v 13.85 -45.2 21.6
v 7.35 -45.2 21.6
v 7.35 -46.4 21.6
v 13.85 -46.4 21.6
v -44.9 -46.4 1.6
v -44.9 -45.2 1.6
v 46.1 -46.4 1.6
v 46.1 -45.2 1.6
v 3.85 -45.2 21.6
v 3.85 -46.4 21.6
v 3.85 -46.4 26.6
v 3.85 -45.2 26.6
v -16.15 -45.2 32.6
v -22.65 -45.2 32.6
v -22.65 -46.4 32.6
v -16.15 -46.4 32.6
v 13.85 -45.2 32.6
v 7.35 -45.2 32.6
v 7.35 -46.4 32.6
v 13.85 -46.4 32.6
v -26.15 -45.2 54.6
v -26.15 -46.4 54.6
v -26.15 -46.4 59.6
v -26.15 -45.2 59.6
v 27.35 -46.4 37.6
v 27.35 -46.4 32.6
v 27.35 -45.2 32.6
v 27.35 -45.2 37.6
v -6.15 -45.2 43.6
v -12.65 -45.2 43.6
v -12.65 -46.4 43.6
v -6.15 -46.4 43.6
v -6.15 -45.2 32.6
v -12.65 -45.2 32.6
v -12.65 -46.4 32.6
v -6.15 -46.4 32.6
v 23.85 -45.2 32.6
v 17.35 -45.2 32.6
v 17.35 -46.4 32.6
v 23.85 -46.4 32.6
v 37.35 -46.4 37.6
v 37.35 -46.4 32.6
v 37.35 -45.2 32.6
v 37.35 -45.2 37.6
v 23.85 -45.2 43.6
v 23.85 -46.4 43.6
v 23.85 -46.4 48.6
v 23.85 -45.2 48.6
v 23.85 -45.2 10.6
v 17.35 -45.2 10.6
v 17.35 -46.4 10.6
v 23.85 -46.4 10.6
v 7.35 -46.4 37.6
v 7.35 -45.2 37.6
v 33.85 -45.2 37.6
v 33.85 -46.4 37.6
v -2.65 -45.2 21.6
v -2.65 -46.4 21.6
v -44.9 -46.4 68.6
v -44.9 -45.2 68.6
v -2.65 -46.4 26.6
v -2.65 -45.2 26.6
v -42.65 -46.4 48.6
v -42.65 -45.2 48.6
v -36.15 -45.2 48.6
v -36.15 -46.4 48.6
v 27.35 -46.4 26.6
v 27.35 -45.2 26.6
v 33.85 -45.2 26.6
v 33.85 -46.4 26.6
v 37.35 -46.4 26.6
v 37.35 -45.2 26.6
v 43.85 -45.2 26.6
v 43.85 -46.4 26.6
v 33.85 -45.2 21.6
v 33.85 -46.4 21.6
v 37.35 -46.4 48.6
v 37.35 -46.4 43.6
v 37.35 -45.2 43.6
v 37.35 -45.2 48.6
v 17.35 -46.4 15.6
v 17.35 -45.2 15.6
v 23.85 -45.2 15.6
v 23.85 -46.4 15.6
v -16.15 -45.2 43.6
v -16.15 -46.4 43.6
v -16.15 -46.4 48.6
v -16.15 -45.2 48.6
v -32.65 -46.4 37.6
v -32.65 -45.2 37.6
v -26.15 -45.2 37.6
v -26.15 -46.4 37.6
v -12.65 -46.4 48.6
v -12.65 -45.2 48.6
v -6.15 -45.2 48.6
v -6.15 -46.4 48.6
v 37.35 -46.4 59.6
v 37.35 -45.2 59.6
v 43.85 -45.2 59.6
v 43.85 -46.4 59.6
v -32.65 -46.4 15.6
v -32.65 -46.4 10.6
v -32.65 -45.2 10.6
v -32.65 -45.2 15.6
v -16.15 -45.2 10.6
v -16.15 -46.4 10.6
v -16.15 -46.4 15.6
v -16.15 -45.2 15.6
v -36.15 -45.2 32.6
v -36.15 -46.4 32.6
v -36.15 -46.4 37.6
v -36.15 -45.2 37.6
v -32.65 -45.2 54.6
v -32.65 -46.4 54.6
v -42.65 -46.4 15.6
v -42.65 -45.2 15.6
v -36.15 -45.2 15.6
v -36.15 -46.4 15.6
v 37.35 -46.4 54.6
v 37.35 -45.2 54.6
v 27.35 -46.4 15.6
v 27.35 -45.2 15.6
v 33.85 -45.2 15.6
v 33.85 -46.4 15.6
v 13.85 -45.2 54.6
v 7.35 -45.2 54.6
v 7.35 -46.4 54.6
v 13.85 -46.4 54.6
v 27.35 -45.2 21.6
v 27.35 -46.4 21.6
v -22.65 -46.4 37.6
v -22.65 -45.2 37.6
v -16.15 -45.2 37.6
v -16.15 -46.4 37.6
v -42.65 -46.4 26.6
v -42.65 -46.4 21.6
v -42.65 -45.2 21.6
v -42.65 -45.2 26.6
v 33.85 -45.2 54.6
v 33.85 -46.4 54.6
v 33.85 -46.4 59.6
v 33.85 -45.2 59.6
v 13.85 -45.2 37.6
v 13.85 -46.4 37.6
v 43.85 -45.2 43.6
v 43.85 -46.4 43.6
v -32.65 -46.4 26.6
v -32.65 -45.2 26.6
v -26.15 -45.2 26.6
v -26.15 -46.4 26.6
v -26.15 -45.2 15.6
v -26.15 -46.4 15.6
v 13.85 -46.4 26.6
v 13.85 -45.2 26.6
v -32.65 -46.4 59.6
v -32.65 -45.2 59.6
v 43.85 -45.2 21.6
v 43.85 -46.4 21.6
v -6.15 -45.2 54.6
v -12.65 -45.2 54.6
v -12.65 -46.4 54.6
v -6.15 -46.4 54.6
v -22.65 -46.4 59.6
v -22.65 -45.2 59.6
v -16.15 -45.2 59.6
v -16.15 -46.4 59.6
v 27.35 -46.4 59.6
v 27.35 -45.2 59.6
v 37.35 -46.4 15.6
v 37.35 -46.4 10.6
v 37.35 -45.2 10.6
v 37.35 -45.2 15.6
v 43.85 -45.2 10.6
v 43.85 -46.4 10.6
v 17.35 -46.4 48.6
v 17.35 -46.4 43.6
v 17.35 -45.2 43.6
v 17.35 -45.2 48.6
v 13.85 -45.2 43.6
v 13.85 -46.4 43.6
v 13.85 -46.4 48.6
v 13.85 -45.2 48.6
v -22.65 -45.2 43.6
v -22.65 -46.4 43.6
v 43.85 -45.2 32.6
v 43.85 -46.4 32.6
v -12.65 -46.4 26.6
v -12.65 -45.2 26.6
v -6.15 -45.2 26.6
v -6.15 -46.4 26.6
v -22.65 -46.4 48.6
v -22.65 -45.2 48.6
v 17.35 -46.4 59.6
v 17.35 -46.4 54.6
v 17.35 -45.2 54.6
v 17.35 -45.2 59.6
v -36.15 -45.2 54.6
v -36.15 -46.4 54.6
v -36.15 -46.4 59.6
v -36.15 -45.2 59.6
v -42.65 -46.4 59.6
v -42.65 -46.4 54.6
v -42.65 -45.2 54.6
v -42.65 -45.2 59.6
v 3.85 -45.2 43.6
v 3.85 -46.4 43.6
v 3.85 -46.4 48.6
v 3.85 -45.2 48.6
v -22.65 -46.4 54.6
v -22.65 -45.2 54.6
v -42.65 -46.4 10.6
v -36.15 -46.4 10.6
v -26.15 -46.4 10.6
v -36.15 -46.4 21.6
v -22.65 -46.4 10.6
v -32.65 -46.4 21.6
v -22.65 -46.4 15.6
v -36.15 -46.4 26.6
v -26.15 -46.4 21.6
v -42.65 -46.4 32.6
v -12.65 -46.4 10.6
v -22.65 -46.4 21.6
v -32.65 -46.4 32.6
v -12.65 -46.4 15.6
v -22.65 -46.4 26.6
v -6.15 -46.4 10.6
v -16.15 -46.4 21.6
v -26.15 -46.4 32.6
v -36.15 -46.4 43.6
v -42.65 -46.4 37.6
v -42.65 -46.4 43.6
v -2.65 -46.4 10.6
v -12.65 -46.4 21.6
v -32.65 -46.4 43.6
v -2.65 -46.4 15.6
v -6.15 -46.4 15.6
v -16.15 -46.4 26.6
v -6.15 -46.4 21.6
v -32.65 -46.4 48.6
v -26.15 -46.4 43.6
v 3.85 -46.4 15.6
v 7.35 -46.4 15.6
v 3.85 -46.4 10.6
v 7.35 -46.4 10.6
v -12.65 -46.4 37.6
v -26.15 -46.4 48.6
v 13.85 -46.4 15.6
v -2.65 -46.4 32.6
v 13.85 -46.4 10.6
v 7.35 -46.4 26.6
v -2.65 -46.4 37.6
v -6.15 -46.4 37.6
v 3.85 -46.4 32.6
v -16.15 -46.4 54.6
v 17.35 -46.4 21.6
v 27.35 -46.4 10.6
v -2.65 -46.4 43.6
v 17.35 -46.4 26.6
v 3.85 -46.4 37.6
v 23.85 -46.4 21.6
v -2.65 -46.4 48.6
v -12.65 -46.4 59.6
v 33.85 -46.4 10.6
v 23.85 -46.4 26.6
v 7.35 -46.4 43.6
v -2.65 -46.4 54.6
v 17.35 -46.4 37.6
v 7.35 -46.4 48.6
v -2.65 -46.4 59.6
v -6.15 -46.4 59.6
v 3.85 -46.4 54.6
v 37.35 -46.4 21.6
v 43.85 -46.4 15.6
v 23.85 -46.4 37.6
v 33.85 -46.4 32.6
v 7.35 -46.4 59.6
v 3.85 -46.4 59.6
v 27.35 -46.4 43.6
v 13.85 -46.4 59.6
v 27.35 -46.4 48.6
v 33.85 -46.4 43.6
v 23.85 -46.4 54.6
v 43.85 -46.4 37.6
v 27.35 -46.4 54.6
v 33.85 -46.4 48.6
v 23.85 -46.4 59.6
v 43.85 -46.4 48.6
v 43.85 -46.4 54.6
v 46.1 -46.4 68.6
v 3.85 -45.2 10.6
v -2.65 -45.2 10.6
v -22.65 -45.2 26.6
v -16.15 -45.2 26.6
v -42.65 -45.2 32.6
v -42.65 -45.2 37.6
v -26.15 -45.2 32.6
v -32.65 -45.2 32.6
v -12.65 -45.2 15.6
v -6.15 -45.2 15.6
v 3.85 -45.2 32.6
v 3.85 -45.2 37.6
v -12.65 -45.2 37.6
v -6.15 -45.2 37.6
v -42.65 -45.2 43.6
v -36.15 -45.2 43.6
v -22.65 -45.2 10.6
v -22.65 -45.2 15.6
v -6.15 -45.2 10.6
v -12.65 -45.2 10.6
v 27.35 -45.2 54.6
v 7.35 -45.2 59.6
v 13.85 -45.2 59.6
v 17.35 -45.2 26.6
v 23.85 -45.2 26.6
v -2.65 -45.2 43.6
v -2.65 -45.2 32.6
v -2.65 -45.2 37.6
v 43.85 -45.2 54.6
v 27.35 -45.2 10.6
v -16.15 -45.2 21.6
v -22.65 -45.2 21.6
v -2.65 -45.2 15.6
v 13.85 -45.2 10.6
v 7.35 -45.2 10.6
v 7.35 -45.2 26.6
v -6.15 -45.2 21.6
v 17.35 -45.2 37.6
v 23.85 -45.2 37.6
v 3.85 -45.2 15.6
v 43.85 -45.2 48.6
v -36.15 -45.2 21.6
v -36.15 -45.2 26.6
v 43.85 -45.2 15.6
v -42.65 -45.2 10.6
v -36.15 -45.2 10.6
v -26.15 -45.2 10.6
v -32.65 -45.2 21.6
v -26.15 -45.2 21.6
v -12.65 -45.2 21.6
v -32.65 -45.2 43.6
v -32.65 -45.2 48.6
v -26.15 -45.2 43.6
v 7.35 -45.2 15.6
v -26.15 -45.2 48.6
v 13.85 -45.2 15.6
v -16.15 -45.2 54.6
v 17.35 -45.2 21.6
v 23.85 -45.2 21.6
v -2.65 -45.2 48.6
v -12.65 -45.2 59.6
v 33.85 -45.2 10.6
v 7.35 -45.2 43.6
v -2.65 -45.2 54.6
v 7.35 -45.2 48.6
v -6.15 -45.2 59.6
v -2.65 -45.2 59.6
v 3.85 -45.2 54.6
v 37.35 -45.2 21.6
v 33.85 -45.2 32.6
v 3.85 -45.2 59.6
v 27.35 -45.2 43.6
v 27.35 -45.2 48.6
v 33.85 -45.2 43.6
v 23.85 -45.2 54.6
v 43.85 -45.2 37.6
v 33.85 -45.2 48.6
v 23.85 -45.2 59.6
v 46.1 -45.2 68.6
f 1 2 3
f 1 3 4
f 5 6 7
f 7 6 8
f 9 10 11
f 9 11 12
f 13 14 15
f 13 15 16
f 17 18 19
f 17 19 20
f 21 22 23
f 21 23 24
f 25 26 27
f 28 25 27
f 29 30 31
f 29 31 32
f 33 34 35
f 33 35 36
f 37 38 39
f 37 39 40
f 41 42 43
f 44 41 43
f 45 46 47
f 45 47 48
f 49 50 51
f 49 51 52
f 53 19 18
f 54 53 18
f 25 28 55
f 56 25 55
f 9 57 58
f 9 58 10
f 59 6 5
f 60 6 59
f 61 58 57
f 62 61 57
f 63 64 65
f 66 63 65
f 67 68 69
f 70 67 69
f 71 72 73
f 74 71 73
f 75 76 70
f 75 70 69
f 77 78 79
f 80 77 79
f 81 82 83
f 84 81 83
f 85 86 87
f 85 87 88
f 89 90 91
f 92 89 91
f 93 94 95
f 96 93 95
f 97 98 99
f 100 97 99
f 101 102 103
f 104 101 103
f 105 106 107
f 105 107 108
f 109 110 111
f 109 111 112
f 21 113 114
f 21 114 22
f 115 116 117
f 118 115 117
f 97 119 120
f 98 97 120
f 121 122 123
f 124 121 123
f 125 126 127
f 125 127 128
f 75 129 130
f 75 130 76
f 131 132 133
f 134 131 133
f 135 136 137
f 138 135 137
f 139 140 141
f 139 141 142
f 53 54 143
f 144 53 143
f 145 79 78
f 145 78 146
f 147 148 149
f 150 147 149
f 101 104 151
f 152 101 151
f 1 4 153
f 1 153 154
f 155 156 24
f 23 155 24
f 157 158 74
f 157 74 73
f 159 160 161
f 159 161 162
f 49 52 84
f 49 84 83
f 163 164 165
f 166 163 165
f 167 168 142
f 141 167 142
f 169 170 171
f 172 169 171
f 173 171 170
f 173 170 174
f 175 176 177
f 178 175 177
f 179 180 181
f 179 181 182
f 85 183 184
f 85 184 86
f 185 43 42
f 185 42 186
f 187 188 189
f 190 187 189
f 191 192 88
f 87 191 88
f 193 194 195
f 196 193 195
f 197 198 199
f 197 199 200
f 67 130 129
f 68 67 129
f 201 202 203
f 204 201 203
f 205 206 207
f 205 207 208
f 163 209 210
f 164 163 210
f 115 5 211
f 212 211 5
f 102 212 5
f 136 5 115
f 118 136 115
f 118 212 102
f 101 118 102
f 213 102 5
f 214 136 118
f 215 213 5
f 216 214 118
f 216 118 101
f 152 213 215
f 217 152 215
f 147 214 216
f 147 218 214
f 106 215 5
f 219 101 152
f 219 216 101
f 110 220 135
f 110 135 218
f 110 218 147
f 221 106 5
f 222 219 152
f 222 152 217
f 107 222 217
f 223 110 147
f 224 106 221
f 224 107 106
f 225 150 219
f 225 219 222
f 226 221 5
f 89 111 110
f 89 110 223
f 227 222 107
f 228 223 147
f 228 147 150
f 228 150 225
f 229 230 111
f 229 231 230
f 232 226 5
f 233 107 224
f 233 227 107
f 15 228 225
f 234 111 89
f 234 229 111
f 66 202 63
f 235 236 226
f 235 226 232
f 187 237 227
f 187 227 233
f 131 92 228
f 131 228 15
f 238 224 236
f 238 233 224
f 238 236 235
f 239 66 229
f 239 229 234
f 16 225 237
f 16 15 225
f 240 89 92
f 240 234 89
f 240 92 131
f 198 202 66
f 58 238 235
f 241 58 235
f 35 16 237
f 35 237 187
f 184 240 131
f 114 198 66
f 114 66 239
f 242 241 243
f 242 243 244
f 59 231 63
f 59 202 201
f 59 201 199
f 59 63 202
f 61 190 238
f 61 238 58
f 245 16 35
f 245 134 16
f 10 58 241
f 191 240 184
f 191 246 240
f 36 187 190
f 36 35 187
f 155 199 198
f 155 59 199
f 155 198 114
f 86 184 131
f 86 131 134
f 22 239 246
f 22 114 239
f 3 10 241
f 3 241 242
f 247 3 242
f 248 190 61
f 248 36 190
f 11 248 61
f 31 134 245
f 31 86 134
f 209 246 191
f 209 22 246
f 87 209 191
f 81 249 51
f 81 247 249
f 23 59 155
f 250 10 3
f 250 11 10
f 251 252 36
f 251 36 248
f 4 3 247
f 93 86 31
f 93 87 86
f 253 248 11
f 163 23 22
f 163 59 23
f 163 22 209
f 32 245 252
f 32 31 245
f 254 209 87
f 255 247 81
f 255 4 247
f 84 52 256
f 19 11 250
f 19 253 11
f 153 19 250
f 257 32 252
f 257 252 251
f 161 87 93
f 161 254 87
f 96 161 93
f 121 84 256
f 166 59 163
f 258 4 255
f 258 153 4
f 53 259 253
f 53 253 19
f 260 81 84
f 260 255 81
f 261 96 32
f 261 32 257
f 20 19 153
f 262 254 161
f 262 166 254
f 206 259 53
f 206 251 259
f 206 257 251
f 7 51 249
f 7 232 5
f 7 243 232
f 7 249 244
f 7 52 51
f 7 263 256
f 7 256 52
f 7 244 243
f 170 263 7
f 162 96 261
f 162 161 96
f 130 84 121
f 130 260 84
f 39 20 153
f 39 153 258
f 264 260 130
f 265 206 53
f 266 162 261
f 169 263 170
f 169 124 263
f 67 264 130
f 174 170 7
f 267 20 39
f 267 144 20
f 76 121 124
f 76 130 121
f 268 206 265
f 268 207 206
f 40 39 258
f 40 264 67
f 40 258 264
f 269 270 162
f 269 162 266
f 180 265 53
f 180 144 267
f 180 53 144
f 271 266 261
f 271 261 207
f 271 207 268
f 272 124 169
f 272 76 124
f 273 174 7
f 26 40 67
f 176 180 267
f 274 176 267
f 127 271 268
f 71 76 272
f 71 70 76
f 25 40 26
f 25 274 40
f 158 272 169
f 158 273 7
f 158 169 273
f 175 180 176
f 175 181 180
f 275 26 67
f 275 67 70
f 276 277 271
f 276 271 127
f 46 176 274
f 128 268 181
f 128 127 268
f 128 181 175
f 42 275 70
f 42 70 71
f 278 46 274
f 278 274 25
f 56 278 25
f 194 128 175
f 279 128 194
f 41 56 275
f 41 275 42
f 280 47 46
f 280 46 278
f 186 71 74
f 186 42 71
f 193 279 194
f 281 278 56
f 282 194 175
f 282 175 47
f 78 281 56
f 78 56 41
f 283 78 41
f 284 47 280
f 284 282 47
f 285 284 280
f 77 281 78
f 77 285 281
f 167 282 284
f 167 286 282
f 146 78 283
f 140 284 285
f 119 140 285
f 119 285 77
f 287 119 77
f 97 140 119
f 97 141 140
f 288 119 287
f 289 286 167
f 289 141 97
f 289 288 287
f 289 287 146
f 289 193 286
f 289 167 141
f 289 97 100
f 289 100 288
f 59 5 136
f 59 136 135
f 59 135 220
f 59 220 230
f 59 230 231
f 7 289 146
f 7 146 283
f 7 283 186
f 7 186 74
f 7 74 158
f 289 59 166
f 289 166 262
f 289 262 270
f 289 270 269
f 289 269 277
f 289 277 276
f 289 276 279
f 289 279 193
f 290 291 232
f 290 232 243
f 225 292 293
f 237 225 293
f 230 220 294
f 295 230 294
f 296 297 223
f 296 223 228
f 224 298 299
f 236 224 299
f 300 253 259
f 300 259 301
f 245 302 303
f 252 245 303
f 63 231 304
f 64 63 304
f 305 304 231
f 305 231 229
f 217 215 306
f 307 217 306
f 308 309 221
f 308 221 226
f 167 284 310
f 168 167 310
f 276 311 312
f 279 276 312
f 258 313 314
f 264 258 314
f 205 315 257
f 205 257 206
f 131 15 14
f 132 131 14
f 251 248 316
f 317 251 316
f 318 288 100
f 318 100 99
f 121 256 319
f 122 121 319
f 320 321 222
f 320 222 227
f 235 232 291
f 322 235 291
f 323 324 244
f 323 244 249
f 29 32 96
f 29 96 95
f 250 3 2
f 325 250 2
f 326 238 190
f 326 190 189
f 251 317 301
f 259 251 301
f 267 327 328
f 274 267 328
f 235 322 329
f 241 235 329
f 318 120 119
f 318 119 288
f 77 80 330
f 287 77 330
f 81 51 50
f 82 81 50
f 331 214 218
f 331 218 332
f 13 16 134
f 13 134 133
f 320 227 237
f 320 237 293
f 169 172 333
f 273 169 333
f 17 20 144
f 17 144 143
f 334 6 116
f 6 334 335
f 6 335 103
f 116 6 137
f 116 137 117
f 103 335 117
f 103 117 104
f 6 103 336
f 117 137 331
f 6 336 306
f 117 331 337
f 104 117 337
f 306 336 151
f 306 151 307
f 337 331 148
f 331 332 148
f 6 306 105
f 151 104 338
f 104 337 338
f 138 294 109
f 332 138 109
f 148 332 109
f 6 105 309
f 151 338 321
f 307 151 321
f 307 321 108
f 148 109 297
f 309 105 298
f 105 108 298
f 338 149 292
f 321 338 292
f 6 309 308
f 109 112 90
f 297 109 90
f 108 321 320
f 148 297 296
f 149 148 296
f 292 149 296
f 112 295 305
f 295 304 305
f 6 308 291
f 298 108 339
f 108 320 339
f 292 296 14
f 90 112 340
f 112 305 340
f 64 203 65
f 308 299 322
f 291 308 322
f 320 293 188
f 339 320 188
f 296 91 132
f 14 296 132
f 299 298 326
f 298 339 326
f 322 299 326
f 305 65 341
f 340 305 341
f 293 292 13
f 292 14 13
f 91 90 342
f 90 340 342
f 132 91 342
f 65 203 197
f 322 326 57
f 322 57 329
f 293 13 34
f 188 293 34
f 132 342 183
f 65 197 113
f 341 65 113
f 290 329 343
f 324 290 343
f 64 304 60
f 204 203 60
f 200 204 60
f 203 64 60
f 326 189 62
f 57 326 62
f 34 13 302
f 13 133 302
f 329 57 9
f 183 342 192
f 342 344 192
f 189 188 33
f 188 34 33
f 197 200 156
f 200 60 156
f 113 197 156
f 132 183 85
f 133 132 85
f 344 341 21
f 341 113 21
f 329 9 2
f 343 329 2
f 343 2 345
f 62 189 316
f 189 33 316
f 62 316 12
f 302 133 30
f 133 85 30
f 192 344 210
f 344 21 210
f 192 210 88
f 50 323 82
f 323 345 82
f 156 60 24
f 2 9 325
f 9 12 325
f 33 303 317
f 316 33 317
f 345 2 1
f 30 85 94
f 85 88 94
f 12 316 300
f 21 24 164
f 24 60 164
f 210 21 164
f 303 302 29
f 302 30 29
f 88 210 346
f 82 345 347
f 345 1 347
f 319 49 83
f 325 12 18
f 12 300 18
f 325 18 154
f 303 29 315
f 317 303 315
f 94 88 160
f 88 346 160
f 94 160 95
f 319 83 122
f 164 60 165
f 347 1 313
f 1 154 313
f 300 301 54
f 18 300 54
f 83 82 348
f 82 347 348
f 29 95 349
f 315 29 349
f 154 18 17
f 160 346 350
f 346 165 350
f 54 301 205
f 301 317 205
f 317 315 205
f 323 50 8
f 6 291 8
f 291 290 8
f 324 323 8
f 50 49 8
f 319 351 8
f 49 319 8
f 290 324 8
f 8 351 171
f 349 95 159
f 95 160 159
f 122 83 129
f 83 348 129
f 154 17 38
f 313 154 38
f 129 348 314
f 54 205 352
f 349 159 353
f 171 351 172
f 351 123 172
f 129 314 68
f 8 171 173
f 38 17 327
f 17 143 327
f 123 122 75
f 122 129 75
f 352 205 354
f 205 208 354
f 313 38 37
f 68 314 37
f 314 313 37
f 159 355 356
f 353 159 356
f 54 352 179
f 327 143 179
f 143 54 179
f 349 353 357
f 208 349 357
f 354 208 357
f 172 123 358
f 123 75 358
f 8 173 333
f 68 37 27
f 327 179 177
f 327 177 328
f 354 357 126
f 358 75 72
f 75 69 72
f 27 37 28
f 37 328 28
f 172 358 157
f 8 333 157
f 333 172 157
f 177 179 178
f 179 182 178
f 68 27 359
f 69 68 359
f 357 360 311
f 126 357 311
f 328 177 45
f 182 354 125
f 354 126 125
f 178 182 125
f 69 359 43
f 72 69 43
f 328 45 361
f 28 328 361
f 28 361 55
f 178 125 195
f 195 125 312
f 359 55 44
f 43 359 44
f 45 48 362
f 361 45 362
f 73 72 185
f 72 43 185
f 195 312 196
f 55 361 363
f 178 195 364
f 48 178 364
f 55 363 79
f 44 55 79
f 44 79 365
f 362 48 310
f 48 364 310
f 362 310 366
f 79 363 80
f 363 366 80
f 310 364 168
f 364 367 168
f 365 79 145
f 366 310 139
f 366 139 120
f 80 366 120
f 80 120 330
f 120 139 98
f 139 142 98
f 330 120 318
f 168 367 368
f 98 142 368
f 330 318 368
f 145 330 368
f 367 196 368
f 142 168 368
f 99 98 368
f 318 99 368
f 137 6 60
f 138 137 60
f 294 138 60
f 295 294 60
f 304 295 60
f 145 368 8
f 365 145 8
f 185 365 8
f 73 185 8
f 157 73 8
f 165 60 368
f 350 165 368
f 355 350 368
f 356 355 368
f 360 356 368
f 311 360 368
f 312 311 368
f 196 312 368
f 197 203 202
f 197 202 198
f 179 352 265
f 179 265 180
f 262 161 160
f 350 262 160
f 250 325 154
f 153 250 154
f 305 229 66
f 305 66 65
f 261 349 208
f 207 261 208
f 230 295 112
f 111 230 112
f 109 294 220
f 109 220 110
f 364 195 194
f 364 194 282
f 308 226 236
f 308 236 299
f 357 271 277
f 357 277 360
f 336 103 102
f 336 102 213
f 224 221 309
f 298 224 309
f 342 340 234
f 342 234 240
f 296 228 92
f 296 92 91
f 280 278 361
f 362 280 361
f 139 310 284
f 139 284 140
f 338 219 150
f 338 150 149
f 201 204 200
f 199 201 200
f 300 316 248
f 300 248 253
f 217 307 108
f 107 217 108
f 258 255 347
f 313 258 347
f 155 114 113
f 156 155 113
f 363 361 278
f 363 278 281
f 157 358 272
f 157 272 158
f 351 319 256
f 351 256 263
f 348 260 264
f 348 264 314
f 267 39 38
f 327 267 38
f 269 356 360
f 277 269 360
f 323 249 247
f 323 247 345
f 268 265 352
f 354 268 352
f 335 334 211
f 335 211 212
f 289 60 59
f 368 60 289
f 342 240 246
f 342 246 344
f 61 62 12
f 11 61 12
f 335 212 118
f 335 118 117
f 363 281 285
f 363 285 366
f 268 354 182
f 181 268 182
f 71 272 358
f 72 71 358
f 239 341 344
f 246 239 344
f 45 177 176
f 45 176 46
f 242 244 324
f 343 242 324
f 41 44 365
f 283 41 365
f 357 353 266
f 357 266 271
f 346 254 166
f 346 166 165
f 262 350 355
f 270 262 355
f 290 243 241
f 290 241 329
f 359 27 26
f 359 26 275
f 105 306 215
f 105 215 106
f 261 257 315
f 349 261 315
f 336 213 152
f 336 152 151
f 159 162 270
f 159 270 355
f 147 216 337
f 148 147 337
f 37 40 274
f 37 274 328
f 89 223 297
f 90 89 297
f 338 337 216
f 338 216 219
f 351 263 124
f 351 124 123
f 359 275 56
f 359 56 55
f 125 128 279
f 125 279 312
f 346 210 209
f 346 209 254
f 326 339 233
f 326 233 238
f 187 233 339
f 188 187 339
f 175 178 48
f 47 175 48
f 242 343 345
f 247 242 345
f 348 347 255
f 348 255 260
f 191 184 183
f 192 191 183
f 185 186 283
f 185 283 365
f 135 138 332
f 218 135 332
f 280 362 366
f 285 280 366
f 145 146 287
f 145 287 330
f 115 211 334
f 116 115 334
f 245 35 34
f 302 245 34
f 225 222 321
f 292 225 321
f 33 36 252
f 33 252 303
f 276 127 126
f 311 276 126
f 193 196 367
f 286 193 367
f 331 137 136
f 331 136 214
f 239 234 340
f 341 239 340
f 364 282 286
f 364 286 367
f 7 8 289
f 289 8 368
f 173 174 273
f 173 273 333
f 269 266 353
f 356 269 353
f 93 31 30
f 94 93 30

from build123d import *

# Parameters (mm, degrees)
BOX007_W         = 6.5
BOX007_H         = 5
BOX007_DEPTH     = 5
ARRAY001_X_COUNT = 9
ARRAY001_X_PITCH = 10
ARRAY001_Z_COUNT = 5
ARRAY001_Z_PITCH = 11
BOX006_W         = 91
BOX006_H         = 67
BOX006_DEPTH     = 1.2


with BuildPart() as array001:
    # Box007 → Box007 (new body)
    with BuildSketch(Plane(origin=(-43, -3, 11), x_dir=(1, 0, 0), z_dir=(0, 0, 1))):
        with Locations((3.25, 2.5)):
            Rectangle(BOX007_W, BOX007_H)
    extrude(amount=BOX007_DEPTH)

    # Array001 X: Array001 ×9


with BuildPart() as array001_1:
    add(array001.part)
    with Locations(*[(i * ARRAY001_X_PITCH, 0, 0) for i in range(1, ARRAY001_X_COUNT)]):
        add(array001.part)

    # Array001 Z: Array001 ×5


with BuildPart() as array001_2:
    add(array001_1.part)
    with Locations(*[(0, 0, i * ARRAY001_Z_PITCH) for i in range(1, ARRAY001_Z_COUNT)]):
        add(array001_1.part)


with BuildPart() as array001_3:
    # Array001 placement: moved
    add(array001_2.part.moved(Location((0.35, 0, -0.4))))


with BuildPart() as rejilla:
    # Box006 → Box006 (new body)
    with BuildSketch(Plane(origin=(-44.9, 0, 1.6), x_dir=(1, 0, 0), z_dir=(0, -1, 0))):
        with Locations((45.5, 33.5)):
            Rectangle(BOX006_W, BOX006_H)
    extrude(amount=BOX006_DEPTH)

    # Cut003: cut Array001
    add(array001_3.part, mode=Mode.SUBTRACT)


with BuildPart() as rejilla_1:
    # Cut003 placement: moved
    add(rejilla.part.moved(Location((0, -45.2, 0))))


solid = rejilla_1.part
